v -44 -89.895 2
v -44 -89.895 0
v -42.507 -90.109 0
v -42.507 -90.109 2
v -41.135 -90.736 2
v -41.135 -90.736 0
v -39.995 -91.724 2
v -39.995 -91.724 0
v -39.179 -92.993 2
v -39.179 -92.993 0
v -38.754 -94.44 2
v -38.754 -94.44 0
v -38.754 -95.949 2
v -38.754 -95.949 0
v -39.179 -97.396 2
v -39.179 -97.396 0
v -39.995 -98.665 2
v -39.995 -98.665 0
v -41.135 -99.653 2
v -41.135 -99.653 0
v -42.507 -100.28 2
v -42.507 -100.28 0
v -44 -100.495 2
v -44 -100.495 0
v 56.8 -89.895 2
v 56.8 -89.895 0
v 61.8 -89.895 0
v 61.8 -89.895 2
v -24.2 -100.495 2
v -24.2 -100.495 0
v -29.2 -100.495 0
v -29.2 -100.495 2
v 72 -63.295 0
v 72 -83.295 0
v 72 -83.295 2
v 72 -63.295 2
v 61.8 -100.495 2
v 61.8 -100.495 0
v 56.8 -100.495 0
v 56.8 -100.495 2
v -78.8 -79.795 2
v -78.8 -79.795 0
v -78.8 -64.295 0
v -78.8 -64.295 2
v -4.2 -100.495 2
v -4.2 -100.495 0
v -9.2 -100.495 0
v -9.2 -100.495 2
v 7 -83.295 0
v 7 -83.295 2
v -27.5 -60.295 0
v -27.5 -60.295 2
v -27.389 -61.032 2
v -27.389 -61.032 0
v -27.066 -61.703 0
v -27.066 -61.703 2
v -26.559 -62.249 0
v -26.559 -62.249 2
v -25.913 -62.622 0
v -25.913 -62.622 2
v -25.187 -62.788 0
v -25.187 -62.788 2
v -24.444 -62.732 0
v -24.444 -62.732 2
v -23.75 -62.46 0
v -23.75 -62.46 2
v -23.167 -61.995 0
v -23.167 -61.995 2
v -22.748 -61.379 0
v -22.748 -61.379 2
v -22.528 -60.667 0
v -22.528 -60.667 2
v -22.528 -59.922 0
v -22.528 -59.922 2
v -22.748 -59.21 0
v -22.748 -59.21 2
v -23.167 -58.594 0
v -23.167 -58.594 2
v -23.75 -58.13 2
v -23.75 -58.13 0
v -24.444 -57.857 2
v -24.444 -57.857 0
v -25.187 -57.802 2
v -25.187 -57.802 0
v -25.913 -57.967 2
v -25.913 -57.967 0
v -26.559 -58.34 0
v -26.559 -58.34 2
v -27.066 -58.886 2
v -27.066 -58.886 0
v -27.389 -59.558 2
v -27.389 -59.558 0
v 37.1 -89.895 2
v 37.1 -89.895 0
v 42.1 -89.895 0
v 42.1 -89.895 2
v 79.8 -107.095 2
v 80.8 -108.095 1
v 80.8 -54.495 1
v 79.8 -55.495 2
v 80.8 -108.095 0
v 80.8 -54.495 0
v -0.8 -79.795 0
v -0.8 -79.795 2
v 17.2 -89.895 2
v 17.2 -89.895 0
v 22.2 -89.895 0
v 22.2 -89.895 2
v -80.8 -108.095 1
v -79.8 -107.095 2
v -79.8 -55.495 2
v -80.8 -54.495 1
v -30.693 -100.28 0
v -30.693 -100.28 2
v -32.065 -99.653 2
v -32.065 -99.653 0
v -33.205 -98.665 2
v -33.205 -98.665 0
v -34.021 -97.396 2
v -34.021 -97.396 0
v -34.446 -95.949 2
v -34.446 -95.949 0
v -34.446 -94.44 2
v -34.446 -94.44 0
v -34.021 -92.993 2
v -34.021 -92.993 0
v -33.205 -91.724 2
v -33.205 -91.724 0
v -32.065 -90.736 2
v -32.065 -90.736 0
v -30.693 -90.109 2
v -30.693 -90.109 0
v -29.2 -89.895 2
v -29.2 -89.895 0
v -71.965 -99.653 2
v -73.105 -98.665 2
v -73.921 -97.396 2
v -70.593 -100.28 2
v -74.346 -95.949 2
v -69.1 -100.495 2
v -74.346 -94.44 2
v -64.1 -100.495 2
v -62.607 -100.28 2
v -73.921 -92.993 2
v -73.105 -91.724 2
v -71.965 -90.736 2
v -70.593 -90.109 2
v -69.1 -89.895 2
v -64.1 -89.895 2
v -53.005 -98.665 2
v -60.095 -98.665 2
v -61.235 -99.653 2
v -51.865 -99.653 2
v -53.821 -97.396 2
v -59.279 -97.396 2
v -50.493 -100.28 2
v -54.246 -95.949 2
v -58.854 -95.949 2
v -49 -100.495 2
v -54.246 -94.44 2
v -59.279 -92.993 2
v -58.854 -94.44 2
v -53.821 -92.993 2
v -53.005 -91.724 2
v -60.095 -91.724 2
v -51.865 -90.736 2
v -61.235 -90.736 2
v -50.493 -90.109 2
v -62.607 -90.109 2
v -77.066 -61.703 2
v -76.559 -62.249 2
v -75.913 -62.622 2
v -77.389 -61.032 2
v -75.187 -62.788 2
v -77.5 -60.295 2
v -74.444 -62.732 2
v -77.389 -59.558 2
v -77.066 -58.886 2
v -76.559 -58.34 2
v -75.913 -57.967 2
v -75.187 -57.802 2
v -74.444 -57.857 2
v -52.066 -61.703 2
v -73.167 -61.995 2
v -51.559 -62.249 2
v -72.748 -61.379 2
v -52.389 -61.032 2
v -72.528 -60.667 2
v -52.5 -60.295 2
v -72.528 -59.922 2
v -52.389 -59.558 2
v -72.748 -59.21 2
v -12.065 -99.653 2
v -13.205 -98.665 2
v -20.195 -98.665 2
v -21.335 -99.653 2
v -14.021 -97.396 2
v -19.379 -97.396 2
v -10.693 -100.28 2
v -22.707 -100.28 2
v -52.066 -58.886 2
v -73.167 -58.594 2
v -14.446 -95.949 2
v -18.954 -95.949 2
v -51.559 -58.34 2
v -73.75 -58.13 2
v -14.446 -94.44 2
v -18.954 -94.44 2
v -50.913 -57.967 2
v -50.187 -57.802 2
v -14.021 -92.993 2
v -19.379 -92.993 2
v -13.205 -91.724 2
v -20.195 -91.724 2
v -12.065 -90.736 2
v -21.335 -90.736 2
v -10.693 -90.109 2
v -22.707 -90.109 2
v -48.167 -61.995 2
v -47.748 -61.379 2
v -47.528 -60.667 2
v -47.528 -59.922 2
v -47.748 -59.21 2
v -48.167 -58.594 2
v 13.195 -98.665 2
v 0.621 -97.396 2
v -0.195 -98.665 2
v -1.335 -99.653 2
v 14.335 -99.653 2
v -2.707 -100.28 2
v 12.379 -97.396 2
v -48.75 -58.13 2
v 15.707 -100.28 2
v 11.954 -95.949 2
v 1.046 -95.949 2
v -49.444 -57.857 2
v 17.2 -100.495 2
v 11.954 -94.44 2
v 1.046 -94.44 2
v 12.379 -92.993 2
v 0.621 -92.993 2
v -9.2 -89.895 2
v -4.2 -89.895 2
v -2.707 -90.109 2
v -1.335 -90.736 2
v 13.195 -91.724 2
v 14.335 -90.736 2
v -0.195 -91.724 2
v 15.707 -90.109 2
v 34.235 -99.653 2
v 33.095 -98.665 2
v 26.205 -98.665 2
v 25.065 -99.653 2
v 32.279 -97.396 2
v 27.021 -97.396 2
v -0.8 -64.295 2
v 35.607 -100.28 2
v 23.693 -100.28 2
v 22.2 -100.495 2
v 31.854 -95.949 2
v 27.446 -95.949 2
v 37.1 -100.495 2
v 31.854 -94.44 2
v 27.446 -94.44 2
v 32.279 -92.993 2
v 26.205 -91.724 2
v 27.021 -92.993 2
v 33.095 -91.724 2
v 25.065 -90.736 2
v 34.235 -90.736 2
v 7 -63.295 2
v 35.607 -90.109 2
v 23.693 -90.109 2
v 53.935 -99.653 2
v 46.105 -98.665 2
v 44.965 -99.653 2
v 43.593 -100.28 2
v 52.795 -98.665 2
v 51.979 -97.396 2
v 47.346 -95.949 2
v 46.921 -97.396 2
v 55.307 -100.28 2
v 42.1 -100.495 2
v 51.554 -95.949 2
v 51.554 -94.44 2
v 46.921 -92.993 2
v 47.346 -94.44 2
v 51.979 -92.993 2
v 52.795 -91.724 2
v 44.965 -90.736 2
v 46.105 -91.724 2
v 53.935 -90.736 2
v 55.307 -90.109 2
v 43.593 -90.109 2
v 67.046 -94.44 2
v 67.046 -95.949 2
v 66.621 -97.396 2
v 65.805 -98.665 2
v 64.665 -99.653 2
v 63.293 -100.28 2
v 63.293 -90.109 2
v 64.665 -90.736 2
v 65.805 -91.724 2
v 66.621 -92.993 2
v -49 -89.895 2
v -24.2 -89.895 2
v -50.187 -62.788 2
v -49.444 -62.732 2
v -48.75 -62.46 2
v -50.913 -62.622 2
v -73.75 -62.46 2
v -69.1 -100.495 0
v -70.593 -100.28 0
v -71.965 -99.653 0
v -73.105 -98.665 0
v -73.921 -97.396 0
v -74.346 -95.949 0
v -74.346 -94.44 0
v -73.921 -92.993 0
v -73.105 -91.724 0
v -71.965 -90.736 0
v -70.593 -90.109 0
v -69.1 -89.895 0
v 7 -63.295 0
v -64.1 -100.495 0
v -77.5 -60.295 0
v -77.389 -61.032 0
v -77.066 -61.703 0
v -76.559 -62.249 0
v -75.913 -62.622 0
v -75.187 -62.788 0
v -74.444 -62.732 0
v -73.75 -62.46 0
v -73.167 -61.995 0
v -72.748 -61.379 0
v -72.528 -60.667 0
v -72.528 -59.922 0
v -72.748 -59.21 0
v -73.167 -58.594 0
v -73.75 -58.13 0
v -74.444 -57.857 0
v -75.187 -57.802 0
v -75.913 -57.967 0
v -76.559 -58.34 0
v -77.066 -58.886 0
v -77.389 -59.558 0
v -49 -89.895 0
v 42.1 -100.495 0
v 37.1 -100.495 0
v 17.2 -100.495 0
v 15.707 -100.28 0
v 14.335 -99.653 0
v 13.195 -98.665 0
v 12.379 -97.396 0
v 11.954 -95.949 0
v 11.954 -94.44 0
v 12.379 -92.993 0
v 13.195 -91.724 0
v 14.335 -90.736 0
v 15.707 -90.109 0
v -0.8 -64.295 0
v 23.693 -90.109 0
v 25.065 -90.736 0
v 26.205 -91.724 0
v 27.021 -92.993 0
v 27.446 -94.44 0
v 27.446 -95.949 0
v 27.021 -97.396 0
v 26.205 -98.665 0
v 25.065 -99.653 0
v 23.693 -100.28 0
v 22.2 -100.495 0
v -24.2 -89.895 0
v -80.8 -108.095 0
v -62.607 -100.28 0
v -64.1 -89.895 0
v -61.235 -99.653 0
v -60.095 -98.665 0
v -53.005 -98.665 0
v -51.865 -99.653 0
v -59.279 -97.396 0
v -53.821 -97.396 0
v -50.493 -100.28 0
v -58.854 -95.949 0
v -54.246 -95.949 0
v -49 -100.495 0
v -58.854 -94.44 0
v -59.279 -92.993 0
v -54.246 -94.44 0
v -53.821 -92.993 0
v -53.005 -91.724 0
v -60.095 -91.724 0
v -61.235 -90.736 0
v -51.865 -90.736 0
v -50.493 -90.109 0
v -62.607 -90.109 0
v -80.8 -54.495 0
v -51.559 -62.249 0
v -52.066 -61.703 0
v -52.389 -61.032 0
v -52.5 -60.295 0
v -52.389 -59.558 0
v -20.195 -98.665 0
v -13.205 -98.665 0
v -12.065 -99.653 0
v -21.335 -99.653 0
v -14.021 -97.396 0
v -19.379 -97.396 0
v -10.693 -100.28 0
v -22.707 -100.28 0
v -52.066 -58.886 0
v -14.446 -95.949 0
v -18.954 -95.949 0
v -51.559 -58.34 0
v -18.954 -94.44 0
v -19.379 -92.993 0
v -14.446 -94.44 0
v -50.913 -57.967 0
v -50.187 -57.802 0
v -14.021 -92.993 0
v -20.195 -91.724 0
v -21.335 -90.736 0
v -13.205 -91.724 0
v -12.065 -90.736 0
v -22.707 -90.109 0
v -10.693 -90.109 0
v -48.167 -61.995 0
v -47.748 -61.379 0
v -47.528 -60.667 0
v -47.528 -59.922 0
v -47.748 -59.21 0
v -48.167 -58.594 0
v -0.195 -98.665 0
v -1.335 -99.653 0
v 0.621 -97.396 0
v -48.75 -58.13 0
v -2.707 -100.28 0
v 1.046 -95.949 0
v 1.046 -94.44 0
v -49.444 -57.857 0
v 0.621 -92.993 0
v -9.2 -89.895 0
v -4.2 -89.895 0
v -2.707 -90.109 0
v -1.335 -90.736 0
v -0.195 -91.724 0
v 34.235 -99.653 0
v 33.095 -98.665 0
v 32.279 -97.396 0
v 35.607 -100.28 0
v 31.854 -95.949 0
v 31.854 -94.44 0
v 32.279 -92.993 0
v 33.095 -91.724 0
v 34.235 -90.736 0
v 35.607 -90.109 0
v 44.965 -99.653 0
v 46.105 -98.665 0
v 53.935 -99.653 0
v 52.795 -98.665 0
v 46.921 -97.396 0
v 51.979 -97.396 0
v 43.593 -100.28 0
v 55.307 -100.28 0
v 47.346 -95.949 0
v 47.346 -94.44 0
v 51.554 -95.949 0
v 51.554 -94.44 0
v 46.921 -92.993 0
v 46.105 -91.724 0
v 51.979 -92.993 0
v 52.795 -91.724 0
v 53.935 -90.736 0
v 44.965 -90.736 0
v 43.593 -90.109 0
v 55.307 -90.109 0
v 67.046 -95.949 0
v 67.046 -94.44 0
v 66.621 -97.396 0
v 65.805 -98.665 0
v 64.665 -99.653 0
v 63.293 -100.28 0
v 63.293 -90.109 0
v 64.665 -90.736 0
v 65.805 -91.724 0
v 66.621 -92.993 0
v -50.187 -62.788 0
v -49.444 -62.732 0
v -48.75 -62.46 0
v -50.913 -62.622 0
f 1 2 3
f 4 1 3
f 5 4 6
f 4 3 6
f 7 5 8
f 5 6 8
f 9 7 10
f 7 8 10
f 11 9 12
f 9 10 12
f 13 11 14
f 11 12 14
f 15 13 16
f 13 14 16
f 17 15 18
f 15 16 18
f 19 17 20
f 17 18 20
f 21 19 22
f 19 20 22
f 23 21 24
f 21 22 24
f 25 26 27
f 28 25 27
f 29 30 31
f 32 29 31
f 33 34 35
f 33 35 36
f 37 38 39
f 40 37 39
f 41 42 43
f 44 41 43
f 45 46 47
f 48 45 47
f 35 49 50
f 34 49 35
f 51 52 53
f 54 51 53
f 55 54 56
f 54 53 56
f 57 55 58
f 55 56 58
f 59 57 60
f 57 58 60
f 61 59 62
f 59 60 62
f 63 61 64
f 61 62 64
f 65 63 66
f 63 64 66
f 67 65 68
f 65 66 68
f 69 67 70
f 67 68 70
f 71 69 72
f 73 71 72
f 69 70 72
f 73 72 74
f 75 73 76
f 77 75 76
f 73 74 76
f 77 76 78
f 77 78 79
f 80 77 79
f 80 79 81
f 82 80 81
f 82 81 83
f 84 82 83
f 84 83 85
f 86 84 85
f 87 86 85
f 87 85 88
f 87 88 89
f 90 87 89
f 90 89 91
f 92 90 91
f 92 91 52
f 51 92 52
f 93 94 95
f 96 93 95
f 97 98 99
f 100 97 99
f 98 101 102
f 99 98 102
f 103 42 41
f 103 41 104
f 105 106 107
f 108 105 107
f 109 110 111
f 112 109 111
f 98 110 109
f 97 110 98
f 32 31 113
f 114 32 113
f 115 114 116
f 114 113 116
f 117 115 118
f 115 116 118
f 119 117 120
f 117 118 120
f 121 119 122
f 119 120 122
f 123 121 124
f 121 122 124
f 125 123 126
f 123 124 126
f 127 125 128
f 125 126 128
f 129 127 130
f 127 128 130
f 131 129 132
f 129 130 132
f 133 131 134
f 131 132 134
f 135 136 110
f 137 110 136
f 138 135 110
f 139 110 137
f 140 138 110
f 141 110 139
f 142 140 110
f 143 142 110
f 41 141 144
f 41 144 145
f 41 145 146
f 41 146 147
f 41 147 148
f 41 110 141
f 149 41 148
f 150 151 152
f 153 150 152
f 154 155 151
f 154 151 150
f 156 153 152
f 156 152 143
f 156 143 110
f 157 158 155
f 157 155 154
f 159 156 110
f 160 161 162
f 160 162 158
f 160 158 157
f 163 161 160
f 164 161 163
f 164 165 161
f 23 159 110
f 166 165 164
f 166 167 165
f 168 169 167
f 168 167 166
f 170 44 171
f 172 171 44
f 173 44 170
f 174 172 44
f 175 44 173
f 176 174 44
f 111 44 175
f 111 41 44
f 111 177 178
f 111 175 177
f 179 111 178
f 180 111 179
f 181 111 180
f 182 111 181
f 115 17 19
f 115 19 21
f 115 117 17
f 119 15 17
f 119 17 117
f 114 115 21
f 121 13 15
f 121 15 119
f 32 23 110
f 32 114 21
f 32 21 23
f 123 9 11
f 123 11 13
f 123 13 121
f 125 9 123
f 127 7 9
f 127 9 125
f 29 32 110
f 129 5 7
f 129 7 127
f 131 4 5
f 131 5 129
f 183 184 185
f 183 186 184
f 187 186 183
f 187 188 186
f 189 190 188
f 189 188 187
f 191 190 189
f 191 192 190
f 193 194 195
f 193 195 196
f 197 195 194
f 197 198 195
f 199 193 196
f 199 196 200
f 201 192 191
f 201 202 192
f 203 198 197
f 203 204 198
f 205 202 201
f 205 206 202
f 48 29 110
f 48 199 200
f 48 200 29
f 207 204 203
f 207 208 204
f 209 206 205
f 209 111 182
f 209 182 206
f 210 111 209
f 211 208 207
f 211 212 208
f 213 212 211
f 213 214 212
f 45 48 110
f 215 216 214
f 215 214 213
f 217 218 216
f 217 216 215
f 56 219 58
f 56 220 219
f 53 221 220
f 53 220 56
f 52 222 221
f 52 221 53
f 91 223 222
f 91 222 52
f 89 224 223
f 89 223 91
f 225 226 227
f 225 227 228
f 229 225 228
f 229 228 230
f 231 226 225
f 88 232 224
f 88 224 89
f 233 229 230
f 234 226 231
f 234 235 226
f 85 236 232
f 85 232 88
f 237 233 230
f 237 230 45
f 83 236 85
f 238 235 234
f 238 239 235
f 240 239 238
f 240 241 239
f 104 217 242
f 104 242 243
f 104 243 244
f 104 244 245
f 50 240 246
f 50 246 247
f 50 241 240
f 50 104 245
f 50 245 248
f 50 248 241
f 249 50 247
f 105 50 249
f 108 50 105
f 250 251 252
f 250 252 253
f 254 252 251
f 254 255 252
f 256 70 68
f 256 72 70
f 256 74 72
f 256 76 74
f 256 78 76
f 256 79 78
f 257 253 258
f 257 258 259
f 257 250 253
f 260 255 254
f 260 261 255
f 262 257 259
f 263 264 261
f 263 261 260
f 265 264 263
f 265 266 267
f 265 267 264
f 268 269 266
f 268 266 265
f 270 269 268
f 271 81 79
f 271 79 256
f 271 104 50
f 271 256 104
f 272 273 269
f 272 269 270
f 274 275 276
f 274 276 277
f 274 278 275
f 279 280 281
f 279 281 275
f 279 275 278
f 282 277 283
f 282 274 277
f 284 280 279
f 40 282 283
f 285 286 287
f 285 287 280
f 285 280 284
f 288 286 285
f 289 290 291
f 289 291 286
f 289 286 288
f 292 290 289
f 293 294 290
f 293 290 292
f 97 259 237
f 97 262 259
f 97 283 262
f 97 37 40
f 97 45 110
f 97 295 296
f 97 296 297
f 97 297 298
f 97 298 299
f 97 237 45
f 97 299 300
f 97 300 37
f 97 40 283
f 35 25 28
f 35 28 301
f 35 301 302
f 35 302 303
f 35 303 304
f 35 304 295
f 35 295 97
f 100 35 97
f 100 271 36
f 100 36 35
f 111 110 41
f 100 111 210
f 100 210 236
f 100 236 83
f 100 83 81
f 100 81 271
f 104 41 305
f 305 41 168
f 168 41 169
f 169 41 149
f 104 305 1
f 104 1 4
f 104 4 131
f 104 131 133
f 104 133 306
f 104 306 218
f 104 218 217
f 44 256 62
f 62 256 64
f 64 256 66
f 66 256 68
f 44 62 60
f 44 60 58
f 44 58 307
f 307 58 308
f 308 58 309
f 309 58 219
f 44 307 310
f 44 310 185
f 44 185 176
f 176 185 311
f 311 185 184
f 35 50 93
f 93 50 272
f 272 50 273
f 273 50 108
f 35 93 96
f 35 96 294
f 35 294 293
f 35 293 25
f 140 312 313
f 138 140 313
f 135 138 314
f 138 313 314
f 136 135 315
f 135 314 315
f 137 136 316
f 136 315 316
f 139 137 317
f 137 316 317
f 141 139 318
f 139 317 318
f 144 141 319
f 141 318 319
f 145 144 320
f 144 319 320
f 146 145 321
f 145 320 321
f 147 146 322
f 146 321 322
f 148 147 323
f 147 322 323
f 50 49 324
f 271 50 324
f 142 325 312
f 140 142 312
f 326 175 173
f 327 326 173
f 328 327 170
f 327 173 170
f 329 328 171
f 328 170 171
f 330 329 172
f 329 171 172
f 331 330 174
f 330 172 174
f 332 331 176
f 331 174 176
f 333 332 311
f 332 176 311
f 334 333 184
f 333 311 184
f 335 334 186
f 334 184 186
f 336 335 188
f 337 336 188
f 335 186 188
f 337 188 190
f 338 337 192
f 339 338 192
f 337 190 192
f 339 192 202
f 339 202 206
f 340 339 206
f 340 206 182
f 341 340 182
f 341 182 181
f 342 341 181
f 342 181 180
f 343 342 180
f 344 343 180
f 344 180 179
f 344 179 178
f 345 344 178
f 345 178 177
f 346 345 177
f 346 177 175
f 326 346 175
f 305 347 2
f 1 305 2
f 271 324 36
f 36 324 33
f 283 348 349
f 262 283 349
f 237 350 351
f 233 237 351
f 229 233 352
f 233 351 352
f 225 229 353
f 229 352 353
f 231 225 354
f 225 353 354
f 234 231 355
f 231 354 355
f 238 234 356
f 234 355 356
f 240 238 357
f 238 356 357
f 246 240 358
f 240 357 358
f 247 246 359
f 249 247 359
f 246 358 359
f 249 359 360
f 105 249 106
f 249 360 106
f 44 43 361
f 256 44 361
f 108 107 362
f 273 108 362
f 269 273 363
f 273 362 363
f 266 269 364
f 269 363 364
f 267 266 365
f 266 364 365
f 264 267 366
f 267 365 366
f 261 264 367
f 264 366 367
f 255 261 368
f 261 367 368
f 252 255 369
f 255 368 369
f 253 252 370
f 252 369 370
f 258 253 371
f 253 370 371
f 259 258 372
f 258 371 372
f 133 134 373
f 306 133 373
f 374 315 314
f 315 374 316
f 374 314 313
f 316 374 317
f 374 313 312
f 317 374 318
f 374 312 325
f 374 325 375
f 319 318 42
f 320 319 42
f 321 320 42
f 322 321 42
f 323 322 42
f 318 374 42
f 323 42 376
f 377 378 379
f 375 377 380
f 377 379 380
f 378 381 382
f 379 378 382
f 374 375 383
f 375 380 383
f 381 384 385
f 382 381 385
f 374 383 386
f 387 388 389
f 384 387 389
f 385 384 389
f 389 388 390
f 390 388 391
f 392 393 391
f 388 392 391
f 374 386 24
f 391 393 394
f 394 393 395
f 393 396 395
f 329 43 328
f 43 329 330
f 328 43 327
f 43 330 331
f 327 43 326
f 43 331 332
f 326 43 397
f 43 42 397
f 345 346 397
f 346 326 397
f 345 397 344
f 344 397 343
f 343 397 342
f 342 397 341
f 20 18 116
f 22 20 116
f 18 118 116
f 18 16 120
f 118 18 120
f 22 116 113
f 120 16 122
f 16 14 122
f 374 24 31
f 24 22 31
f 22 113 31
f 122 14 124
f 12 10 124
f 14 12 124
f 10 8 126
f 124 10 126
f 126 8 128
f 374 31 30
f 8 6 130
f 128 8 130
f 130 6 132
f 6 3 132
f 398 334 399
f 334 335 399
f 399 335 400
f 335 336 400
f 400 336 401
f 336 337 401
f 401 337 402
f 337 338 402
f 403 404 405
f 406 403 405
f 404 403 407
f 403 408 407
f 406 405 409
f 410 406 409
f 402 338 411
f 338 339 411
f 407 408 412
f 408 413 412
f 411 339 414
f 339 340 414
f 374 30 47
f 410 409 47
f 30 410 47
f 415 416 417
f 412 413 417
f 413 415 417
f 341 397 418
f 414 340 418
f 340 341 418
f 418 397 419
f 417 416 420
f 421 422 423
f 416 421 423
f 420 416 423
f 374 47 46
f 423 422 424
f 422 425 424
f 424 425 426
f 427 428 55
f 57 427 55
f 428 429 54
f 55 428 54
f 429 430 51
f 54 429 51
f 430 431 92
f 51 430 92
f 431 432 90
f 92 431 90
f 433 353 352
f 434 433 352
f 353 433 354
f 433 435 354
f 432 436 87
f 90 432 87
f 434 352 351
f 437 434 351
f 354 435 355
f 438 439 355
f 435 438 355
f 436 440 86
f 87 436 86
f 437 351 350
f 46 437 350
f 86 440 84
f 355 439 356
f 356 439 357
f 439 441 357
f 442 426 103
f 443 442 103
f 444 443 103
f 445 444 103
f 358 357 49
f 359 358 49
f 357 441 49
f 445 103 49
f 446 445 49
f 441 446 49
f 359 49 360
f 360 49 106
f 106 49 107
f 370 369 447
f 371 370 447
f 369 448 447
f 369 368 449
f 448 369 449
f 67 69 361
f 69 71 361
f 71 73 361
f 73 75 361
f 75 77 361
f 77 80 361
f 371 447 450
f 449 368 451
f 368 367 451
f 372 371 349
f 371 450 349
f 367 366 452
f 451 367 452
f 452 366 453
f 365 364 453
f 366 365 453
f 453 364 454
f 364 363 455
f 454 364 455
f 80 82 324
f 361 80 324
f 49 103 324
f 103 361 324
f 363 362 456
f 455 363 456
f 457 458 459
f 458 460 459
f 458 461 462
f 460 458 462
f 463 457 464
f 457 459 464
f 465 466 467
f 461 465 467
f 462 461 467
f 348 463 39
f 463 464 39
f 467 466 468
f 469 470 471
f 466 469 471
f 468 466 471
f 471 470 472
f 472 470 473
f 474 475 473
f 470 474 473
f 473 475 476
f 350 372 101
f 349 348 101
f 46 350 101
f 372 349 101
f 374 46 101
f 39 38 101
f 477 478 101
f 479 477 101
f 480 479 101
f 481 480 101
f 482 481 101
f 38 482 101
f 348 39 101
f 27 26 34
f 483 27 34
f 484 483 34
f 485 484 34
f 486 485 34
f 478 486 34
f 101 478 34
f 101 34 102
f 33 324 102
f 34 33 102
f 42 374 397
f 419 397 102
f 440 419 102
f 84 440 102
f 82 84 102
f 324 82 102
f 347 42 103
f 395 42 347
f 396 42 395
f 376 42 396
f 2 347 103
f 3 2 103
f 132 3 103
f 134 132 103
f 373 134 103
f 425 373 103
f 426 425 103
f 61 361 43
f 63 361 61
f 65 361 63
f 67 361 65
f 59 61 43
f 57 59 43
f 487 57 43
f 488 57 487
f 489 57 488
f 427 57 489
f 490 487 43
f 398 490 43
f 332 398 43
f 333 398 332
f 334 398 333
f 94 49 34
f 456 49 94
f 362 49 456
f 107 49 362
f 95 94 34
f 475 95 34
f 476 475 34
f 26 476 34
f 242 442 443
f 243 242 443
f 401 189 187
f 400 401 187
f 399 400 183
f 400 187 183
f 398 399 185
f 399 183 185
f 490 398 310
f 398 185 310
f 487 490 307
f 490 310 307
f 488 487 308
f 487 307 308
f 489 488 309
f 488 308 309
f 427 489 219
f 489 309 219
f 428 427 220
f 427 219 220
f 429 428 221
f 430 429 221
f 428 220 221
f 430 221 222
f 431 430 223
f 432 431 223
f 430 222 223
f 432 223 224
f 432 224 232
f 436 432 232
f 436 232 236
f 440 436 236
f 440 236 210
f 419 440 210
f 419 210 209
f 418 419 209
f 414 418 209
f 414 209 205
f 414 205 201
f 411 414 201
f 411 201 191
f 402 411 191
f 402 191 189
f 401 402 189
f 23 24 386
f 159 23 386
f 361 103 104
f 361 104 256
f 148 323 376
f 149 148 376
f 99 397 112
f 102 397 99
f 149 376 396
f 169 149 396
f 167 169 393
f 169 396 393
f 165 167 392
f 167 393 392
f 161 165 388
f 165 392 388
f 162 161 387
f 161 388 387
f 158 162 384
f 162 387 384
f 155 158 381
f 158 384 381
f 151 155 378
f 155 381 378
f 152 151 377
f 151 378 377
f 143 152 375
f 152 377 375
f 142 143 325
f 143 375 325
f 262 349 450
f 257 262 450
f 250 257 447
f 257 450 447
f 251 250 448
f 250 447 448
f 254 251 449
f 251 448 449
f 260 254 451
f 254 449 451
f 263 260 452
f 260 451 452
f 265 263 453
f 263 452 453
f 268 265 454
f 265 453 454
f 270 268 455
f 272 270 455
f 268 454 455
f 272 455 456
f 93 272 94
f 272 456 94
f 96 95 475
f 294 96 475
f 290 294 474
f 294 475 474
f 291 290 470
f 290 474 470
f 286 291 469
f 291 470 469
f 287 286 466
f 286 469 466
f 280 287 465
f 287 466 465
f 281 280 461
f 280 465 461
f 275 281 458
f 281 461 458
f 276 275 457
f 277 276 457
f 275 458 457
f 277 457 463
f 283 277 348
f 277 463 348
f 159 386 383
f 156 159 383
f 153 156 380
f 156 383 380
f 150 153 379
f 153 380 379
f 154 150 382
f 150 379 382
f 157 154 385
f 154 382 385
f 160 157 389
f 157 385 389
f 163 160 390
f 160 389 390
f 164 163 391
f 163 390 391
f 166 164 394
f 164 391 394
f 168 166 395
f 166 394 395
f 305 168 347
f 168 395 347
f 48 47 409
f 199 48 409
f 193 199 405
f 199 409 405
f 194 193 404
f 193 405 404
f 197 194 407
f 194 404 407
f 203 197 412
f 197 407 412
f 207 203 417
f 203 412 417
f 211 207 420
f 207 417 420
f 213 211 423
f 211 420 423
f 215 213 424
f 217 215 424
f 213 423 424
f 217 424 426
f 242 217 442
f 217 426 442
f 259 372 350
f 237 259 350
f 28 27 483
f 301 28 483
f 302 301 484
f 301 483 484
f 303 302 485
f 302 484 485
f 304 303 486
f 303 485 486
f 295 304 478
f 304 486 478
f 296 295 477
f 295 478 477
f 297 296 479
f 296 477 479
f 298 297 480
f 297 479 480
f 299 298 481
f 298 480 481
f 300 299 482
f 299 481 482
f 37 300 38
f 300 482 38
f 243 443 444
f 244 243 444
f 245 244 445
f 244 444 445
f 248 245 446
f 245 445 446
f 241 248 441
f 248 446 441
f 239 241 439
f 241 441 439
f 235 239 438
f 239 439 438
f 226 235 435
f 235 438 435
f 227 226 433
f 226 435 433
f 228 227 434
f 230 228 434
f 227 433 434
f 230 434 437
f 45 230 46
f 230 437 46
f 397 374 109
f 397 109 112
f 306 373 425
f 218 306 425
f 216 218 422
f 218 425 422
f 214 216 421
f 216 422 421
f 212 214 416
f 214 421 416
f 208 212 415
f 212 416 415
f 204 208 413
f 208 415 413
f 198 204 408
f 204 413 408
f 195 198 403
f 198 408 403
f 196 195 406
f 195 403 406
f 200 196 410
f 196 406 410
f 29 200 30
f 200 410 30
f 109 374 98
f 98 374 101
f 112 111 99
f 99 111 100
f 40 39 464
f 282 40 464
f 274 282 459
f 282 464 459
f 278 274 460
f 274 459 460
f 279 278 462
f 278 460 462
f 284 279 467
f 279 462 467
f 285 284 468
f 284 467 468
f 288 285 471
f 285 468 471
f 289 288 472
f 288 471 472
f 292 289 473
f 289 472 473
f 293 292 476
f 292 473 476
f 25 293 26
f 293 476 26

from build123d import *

# Parameters (mm, degrees)
F0_W     = 161.6
F0_H     = 53.6
F0_W_2   = 78
F0_H_2   = 15.5
F0_W_3   = 65
F0_H_3   = 20
F1_DEPTH = 2
F2_D     = 5
F3_SIZE  = 1


with BuildPart() as f1:
    # F0 (on Top) → F1 (new body)
    with BuildSketch(Plane.XY):
        with Locations((0, -81.2946302295)):
            Rectangle(F0_W, F0_H)
        with BuildLine():
            ThreePointArc((-69.1, -100.4946302295), (-74.4, -95.1946302295), (-69.1, -89.8946302295))
            Line((-69.1, -89.8946302295), (-64.1, -89.8946302295))
            ThreePointArc((-64.1, -89.8946302295), (-58.8, -95.1946302295), (-64.1, -100.4946302295))
            Line((-64.1, -100.4946302295), (-69.1, -100.4946302295))
        make_face(mode=Mode.SUBTRACT)
        with BuildLine():
            ThreePointArc((-49, -100.4946302295), (-54.3, -95.1946302295), (-49, -89.8946302295))
            Line((-49, -89.8946302295), (-44, -89.8946302295))
            ThreePointArc((-44, -89.8946302295), (-38.7, -95.1946302295), (-44, -100.4946302295))
            Line((-44, -100.4946302295), (-49, -100.4946302295))
        make_face(mode=Mode.SUBTRACT)
        with BuildLine():
            ThreePointArc((-29.2, -100.4946302295), (-34.5, -95.1946302295), (-29.2, -89.8946302295))
            Line((-29.2, -89.8946302295), (-24.2, -89.8946302295))
            ThreePointArc((-24.2, -89.8946302295), (-18.9, -95.1946302295), (-24.2, -100.4946302295))
            Line((-24.2, -100.4946302295), (-29.2, -100.4946302295))
        make_face(mode=Mode.SUBTRACT)
        with BuildLine():
            ThreePointArc((-9.2, -100.4946302295), (-14.5, -95.1946302295), (-9.2, -89.8946302295))
            Line((-9.2, -89.8946302295), (-4.2, -89.8946302295))
            ThreePointArc((-4.2, -89.8946302295), (1.1, -95.1946302295), (-4.2, -100.4946302295))
            Line((-4.2, -100.4946302295), (-9.2, -100.4946302295))
        make_face(mode=Mode.SUBTRACT)
        with BuildLine():
            ThreePointArc((17.2, -100.4946302295), (11.9, -95.1946302295), (17.2, -89.8946302295))
            Line((17.2, -89.8946302295), (22.2, -89.8946302295))
            ThreePointArc((22.2, -89.8946302295), (27.5, -95.1946302295), (22.2, -100.4946302295))
            Line((22.2, -100.4946302295), (17.2, -100.4946302295))
        make_face(mode=Mode.SUBTRACT)
        with BuildLine():
            ThreePointArc((37.1, -100.4946302295), (31.8, -95.1946302295), (37.1, -89.8946302295))
            Line((37.1, -89.8946302295), (42.1, -89.8946302295))
            ThreePointArc((42.1, -89.8946302295), (47.4, -95.1946302295), (42.1, -100.4946302295))
            Line((42.1, -100.4946302295), (37.1, -100.4946302295))
        make_face(mode=Mode.SUBTRACT)
        with BuildLine():
            ThreePointArc((56.8, -100.4946302295), (51.5, -95.1946302295), (56.8, -89.8946302295))
            Line((56.8, -89.8946302295), (61.8, -89.8946302295))
            ThreePointArc((61.8, -89.8946302295), (67.1, -95.1946302295), (61.8, -100.4946302295))
            Line((61.8, -100.4946302295), (56.8, -100.4946302295))
        make_face(mode=Mode.SUBTRACT)
        with Locations((-39.8, -72.0446302295)):
            Rectangle(F0_W_2, F0_H_2, mode=Mode.SUBTRACT)
        with Locations((39.5, -73.2946302295)):
            Rectangle(F0_W_3, F0_H_3, mode=Mode.SUBTRACT)
    extrude(amount=F1_DEPTH)

    # F2 (through all)
    with Locations(Plane(origin=(0, 0, 0), x_dir=(1, 0, 0), z_dir=(0, 0, -1))):
        with Locations((-75, 60.2946302295), (-50, 60.2946302295), (-25, 60.2946302295)):
            Hole(F2_D / 2)

    # F3
    f3_edges = [f1.edges().sort_by_distance(p)[0] for p in [
        (-80.8, -81.29463, 2),
        (0, -108.09463, 2),
        (0, -54.49463, 2),
        (80.8, -81.29463, 2),
    ]]
    chamfer(f3_edges, length=F3_SIZE)


solid = f1.part
